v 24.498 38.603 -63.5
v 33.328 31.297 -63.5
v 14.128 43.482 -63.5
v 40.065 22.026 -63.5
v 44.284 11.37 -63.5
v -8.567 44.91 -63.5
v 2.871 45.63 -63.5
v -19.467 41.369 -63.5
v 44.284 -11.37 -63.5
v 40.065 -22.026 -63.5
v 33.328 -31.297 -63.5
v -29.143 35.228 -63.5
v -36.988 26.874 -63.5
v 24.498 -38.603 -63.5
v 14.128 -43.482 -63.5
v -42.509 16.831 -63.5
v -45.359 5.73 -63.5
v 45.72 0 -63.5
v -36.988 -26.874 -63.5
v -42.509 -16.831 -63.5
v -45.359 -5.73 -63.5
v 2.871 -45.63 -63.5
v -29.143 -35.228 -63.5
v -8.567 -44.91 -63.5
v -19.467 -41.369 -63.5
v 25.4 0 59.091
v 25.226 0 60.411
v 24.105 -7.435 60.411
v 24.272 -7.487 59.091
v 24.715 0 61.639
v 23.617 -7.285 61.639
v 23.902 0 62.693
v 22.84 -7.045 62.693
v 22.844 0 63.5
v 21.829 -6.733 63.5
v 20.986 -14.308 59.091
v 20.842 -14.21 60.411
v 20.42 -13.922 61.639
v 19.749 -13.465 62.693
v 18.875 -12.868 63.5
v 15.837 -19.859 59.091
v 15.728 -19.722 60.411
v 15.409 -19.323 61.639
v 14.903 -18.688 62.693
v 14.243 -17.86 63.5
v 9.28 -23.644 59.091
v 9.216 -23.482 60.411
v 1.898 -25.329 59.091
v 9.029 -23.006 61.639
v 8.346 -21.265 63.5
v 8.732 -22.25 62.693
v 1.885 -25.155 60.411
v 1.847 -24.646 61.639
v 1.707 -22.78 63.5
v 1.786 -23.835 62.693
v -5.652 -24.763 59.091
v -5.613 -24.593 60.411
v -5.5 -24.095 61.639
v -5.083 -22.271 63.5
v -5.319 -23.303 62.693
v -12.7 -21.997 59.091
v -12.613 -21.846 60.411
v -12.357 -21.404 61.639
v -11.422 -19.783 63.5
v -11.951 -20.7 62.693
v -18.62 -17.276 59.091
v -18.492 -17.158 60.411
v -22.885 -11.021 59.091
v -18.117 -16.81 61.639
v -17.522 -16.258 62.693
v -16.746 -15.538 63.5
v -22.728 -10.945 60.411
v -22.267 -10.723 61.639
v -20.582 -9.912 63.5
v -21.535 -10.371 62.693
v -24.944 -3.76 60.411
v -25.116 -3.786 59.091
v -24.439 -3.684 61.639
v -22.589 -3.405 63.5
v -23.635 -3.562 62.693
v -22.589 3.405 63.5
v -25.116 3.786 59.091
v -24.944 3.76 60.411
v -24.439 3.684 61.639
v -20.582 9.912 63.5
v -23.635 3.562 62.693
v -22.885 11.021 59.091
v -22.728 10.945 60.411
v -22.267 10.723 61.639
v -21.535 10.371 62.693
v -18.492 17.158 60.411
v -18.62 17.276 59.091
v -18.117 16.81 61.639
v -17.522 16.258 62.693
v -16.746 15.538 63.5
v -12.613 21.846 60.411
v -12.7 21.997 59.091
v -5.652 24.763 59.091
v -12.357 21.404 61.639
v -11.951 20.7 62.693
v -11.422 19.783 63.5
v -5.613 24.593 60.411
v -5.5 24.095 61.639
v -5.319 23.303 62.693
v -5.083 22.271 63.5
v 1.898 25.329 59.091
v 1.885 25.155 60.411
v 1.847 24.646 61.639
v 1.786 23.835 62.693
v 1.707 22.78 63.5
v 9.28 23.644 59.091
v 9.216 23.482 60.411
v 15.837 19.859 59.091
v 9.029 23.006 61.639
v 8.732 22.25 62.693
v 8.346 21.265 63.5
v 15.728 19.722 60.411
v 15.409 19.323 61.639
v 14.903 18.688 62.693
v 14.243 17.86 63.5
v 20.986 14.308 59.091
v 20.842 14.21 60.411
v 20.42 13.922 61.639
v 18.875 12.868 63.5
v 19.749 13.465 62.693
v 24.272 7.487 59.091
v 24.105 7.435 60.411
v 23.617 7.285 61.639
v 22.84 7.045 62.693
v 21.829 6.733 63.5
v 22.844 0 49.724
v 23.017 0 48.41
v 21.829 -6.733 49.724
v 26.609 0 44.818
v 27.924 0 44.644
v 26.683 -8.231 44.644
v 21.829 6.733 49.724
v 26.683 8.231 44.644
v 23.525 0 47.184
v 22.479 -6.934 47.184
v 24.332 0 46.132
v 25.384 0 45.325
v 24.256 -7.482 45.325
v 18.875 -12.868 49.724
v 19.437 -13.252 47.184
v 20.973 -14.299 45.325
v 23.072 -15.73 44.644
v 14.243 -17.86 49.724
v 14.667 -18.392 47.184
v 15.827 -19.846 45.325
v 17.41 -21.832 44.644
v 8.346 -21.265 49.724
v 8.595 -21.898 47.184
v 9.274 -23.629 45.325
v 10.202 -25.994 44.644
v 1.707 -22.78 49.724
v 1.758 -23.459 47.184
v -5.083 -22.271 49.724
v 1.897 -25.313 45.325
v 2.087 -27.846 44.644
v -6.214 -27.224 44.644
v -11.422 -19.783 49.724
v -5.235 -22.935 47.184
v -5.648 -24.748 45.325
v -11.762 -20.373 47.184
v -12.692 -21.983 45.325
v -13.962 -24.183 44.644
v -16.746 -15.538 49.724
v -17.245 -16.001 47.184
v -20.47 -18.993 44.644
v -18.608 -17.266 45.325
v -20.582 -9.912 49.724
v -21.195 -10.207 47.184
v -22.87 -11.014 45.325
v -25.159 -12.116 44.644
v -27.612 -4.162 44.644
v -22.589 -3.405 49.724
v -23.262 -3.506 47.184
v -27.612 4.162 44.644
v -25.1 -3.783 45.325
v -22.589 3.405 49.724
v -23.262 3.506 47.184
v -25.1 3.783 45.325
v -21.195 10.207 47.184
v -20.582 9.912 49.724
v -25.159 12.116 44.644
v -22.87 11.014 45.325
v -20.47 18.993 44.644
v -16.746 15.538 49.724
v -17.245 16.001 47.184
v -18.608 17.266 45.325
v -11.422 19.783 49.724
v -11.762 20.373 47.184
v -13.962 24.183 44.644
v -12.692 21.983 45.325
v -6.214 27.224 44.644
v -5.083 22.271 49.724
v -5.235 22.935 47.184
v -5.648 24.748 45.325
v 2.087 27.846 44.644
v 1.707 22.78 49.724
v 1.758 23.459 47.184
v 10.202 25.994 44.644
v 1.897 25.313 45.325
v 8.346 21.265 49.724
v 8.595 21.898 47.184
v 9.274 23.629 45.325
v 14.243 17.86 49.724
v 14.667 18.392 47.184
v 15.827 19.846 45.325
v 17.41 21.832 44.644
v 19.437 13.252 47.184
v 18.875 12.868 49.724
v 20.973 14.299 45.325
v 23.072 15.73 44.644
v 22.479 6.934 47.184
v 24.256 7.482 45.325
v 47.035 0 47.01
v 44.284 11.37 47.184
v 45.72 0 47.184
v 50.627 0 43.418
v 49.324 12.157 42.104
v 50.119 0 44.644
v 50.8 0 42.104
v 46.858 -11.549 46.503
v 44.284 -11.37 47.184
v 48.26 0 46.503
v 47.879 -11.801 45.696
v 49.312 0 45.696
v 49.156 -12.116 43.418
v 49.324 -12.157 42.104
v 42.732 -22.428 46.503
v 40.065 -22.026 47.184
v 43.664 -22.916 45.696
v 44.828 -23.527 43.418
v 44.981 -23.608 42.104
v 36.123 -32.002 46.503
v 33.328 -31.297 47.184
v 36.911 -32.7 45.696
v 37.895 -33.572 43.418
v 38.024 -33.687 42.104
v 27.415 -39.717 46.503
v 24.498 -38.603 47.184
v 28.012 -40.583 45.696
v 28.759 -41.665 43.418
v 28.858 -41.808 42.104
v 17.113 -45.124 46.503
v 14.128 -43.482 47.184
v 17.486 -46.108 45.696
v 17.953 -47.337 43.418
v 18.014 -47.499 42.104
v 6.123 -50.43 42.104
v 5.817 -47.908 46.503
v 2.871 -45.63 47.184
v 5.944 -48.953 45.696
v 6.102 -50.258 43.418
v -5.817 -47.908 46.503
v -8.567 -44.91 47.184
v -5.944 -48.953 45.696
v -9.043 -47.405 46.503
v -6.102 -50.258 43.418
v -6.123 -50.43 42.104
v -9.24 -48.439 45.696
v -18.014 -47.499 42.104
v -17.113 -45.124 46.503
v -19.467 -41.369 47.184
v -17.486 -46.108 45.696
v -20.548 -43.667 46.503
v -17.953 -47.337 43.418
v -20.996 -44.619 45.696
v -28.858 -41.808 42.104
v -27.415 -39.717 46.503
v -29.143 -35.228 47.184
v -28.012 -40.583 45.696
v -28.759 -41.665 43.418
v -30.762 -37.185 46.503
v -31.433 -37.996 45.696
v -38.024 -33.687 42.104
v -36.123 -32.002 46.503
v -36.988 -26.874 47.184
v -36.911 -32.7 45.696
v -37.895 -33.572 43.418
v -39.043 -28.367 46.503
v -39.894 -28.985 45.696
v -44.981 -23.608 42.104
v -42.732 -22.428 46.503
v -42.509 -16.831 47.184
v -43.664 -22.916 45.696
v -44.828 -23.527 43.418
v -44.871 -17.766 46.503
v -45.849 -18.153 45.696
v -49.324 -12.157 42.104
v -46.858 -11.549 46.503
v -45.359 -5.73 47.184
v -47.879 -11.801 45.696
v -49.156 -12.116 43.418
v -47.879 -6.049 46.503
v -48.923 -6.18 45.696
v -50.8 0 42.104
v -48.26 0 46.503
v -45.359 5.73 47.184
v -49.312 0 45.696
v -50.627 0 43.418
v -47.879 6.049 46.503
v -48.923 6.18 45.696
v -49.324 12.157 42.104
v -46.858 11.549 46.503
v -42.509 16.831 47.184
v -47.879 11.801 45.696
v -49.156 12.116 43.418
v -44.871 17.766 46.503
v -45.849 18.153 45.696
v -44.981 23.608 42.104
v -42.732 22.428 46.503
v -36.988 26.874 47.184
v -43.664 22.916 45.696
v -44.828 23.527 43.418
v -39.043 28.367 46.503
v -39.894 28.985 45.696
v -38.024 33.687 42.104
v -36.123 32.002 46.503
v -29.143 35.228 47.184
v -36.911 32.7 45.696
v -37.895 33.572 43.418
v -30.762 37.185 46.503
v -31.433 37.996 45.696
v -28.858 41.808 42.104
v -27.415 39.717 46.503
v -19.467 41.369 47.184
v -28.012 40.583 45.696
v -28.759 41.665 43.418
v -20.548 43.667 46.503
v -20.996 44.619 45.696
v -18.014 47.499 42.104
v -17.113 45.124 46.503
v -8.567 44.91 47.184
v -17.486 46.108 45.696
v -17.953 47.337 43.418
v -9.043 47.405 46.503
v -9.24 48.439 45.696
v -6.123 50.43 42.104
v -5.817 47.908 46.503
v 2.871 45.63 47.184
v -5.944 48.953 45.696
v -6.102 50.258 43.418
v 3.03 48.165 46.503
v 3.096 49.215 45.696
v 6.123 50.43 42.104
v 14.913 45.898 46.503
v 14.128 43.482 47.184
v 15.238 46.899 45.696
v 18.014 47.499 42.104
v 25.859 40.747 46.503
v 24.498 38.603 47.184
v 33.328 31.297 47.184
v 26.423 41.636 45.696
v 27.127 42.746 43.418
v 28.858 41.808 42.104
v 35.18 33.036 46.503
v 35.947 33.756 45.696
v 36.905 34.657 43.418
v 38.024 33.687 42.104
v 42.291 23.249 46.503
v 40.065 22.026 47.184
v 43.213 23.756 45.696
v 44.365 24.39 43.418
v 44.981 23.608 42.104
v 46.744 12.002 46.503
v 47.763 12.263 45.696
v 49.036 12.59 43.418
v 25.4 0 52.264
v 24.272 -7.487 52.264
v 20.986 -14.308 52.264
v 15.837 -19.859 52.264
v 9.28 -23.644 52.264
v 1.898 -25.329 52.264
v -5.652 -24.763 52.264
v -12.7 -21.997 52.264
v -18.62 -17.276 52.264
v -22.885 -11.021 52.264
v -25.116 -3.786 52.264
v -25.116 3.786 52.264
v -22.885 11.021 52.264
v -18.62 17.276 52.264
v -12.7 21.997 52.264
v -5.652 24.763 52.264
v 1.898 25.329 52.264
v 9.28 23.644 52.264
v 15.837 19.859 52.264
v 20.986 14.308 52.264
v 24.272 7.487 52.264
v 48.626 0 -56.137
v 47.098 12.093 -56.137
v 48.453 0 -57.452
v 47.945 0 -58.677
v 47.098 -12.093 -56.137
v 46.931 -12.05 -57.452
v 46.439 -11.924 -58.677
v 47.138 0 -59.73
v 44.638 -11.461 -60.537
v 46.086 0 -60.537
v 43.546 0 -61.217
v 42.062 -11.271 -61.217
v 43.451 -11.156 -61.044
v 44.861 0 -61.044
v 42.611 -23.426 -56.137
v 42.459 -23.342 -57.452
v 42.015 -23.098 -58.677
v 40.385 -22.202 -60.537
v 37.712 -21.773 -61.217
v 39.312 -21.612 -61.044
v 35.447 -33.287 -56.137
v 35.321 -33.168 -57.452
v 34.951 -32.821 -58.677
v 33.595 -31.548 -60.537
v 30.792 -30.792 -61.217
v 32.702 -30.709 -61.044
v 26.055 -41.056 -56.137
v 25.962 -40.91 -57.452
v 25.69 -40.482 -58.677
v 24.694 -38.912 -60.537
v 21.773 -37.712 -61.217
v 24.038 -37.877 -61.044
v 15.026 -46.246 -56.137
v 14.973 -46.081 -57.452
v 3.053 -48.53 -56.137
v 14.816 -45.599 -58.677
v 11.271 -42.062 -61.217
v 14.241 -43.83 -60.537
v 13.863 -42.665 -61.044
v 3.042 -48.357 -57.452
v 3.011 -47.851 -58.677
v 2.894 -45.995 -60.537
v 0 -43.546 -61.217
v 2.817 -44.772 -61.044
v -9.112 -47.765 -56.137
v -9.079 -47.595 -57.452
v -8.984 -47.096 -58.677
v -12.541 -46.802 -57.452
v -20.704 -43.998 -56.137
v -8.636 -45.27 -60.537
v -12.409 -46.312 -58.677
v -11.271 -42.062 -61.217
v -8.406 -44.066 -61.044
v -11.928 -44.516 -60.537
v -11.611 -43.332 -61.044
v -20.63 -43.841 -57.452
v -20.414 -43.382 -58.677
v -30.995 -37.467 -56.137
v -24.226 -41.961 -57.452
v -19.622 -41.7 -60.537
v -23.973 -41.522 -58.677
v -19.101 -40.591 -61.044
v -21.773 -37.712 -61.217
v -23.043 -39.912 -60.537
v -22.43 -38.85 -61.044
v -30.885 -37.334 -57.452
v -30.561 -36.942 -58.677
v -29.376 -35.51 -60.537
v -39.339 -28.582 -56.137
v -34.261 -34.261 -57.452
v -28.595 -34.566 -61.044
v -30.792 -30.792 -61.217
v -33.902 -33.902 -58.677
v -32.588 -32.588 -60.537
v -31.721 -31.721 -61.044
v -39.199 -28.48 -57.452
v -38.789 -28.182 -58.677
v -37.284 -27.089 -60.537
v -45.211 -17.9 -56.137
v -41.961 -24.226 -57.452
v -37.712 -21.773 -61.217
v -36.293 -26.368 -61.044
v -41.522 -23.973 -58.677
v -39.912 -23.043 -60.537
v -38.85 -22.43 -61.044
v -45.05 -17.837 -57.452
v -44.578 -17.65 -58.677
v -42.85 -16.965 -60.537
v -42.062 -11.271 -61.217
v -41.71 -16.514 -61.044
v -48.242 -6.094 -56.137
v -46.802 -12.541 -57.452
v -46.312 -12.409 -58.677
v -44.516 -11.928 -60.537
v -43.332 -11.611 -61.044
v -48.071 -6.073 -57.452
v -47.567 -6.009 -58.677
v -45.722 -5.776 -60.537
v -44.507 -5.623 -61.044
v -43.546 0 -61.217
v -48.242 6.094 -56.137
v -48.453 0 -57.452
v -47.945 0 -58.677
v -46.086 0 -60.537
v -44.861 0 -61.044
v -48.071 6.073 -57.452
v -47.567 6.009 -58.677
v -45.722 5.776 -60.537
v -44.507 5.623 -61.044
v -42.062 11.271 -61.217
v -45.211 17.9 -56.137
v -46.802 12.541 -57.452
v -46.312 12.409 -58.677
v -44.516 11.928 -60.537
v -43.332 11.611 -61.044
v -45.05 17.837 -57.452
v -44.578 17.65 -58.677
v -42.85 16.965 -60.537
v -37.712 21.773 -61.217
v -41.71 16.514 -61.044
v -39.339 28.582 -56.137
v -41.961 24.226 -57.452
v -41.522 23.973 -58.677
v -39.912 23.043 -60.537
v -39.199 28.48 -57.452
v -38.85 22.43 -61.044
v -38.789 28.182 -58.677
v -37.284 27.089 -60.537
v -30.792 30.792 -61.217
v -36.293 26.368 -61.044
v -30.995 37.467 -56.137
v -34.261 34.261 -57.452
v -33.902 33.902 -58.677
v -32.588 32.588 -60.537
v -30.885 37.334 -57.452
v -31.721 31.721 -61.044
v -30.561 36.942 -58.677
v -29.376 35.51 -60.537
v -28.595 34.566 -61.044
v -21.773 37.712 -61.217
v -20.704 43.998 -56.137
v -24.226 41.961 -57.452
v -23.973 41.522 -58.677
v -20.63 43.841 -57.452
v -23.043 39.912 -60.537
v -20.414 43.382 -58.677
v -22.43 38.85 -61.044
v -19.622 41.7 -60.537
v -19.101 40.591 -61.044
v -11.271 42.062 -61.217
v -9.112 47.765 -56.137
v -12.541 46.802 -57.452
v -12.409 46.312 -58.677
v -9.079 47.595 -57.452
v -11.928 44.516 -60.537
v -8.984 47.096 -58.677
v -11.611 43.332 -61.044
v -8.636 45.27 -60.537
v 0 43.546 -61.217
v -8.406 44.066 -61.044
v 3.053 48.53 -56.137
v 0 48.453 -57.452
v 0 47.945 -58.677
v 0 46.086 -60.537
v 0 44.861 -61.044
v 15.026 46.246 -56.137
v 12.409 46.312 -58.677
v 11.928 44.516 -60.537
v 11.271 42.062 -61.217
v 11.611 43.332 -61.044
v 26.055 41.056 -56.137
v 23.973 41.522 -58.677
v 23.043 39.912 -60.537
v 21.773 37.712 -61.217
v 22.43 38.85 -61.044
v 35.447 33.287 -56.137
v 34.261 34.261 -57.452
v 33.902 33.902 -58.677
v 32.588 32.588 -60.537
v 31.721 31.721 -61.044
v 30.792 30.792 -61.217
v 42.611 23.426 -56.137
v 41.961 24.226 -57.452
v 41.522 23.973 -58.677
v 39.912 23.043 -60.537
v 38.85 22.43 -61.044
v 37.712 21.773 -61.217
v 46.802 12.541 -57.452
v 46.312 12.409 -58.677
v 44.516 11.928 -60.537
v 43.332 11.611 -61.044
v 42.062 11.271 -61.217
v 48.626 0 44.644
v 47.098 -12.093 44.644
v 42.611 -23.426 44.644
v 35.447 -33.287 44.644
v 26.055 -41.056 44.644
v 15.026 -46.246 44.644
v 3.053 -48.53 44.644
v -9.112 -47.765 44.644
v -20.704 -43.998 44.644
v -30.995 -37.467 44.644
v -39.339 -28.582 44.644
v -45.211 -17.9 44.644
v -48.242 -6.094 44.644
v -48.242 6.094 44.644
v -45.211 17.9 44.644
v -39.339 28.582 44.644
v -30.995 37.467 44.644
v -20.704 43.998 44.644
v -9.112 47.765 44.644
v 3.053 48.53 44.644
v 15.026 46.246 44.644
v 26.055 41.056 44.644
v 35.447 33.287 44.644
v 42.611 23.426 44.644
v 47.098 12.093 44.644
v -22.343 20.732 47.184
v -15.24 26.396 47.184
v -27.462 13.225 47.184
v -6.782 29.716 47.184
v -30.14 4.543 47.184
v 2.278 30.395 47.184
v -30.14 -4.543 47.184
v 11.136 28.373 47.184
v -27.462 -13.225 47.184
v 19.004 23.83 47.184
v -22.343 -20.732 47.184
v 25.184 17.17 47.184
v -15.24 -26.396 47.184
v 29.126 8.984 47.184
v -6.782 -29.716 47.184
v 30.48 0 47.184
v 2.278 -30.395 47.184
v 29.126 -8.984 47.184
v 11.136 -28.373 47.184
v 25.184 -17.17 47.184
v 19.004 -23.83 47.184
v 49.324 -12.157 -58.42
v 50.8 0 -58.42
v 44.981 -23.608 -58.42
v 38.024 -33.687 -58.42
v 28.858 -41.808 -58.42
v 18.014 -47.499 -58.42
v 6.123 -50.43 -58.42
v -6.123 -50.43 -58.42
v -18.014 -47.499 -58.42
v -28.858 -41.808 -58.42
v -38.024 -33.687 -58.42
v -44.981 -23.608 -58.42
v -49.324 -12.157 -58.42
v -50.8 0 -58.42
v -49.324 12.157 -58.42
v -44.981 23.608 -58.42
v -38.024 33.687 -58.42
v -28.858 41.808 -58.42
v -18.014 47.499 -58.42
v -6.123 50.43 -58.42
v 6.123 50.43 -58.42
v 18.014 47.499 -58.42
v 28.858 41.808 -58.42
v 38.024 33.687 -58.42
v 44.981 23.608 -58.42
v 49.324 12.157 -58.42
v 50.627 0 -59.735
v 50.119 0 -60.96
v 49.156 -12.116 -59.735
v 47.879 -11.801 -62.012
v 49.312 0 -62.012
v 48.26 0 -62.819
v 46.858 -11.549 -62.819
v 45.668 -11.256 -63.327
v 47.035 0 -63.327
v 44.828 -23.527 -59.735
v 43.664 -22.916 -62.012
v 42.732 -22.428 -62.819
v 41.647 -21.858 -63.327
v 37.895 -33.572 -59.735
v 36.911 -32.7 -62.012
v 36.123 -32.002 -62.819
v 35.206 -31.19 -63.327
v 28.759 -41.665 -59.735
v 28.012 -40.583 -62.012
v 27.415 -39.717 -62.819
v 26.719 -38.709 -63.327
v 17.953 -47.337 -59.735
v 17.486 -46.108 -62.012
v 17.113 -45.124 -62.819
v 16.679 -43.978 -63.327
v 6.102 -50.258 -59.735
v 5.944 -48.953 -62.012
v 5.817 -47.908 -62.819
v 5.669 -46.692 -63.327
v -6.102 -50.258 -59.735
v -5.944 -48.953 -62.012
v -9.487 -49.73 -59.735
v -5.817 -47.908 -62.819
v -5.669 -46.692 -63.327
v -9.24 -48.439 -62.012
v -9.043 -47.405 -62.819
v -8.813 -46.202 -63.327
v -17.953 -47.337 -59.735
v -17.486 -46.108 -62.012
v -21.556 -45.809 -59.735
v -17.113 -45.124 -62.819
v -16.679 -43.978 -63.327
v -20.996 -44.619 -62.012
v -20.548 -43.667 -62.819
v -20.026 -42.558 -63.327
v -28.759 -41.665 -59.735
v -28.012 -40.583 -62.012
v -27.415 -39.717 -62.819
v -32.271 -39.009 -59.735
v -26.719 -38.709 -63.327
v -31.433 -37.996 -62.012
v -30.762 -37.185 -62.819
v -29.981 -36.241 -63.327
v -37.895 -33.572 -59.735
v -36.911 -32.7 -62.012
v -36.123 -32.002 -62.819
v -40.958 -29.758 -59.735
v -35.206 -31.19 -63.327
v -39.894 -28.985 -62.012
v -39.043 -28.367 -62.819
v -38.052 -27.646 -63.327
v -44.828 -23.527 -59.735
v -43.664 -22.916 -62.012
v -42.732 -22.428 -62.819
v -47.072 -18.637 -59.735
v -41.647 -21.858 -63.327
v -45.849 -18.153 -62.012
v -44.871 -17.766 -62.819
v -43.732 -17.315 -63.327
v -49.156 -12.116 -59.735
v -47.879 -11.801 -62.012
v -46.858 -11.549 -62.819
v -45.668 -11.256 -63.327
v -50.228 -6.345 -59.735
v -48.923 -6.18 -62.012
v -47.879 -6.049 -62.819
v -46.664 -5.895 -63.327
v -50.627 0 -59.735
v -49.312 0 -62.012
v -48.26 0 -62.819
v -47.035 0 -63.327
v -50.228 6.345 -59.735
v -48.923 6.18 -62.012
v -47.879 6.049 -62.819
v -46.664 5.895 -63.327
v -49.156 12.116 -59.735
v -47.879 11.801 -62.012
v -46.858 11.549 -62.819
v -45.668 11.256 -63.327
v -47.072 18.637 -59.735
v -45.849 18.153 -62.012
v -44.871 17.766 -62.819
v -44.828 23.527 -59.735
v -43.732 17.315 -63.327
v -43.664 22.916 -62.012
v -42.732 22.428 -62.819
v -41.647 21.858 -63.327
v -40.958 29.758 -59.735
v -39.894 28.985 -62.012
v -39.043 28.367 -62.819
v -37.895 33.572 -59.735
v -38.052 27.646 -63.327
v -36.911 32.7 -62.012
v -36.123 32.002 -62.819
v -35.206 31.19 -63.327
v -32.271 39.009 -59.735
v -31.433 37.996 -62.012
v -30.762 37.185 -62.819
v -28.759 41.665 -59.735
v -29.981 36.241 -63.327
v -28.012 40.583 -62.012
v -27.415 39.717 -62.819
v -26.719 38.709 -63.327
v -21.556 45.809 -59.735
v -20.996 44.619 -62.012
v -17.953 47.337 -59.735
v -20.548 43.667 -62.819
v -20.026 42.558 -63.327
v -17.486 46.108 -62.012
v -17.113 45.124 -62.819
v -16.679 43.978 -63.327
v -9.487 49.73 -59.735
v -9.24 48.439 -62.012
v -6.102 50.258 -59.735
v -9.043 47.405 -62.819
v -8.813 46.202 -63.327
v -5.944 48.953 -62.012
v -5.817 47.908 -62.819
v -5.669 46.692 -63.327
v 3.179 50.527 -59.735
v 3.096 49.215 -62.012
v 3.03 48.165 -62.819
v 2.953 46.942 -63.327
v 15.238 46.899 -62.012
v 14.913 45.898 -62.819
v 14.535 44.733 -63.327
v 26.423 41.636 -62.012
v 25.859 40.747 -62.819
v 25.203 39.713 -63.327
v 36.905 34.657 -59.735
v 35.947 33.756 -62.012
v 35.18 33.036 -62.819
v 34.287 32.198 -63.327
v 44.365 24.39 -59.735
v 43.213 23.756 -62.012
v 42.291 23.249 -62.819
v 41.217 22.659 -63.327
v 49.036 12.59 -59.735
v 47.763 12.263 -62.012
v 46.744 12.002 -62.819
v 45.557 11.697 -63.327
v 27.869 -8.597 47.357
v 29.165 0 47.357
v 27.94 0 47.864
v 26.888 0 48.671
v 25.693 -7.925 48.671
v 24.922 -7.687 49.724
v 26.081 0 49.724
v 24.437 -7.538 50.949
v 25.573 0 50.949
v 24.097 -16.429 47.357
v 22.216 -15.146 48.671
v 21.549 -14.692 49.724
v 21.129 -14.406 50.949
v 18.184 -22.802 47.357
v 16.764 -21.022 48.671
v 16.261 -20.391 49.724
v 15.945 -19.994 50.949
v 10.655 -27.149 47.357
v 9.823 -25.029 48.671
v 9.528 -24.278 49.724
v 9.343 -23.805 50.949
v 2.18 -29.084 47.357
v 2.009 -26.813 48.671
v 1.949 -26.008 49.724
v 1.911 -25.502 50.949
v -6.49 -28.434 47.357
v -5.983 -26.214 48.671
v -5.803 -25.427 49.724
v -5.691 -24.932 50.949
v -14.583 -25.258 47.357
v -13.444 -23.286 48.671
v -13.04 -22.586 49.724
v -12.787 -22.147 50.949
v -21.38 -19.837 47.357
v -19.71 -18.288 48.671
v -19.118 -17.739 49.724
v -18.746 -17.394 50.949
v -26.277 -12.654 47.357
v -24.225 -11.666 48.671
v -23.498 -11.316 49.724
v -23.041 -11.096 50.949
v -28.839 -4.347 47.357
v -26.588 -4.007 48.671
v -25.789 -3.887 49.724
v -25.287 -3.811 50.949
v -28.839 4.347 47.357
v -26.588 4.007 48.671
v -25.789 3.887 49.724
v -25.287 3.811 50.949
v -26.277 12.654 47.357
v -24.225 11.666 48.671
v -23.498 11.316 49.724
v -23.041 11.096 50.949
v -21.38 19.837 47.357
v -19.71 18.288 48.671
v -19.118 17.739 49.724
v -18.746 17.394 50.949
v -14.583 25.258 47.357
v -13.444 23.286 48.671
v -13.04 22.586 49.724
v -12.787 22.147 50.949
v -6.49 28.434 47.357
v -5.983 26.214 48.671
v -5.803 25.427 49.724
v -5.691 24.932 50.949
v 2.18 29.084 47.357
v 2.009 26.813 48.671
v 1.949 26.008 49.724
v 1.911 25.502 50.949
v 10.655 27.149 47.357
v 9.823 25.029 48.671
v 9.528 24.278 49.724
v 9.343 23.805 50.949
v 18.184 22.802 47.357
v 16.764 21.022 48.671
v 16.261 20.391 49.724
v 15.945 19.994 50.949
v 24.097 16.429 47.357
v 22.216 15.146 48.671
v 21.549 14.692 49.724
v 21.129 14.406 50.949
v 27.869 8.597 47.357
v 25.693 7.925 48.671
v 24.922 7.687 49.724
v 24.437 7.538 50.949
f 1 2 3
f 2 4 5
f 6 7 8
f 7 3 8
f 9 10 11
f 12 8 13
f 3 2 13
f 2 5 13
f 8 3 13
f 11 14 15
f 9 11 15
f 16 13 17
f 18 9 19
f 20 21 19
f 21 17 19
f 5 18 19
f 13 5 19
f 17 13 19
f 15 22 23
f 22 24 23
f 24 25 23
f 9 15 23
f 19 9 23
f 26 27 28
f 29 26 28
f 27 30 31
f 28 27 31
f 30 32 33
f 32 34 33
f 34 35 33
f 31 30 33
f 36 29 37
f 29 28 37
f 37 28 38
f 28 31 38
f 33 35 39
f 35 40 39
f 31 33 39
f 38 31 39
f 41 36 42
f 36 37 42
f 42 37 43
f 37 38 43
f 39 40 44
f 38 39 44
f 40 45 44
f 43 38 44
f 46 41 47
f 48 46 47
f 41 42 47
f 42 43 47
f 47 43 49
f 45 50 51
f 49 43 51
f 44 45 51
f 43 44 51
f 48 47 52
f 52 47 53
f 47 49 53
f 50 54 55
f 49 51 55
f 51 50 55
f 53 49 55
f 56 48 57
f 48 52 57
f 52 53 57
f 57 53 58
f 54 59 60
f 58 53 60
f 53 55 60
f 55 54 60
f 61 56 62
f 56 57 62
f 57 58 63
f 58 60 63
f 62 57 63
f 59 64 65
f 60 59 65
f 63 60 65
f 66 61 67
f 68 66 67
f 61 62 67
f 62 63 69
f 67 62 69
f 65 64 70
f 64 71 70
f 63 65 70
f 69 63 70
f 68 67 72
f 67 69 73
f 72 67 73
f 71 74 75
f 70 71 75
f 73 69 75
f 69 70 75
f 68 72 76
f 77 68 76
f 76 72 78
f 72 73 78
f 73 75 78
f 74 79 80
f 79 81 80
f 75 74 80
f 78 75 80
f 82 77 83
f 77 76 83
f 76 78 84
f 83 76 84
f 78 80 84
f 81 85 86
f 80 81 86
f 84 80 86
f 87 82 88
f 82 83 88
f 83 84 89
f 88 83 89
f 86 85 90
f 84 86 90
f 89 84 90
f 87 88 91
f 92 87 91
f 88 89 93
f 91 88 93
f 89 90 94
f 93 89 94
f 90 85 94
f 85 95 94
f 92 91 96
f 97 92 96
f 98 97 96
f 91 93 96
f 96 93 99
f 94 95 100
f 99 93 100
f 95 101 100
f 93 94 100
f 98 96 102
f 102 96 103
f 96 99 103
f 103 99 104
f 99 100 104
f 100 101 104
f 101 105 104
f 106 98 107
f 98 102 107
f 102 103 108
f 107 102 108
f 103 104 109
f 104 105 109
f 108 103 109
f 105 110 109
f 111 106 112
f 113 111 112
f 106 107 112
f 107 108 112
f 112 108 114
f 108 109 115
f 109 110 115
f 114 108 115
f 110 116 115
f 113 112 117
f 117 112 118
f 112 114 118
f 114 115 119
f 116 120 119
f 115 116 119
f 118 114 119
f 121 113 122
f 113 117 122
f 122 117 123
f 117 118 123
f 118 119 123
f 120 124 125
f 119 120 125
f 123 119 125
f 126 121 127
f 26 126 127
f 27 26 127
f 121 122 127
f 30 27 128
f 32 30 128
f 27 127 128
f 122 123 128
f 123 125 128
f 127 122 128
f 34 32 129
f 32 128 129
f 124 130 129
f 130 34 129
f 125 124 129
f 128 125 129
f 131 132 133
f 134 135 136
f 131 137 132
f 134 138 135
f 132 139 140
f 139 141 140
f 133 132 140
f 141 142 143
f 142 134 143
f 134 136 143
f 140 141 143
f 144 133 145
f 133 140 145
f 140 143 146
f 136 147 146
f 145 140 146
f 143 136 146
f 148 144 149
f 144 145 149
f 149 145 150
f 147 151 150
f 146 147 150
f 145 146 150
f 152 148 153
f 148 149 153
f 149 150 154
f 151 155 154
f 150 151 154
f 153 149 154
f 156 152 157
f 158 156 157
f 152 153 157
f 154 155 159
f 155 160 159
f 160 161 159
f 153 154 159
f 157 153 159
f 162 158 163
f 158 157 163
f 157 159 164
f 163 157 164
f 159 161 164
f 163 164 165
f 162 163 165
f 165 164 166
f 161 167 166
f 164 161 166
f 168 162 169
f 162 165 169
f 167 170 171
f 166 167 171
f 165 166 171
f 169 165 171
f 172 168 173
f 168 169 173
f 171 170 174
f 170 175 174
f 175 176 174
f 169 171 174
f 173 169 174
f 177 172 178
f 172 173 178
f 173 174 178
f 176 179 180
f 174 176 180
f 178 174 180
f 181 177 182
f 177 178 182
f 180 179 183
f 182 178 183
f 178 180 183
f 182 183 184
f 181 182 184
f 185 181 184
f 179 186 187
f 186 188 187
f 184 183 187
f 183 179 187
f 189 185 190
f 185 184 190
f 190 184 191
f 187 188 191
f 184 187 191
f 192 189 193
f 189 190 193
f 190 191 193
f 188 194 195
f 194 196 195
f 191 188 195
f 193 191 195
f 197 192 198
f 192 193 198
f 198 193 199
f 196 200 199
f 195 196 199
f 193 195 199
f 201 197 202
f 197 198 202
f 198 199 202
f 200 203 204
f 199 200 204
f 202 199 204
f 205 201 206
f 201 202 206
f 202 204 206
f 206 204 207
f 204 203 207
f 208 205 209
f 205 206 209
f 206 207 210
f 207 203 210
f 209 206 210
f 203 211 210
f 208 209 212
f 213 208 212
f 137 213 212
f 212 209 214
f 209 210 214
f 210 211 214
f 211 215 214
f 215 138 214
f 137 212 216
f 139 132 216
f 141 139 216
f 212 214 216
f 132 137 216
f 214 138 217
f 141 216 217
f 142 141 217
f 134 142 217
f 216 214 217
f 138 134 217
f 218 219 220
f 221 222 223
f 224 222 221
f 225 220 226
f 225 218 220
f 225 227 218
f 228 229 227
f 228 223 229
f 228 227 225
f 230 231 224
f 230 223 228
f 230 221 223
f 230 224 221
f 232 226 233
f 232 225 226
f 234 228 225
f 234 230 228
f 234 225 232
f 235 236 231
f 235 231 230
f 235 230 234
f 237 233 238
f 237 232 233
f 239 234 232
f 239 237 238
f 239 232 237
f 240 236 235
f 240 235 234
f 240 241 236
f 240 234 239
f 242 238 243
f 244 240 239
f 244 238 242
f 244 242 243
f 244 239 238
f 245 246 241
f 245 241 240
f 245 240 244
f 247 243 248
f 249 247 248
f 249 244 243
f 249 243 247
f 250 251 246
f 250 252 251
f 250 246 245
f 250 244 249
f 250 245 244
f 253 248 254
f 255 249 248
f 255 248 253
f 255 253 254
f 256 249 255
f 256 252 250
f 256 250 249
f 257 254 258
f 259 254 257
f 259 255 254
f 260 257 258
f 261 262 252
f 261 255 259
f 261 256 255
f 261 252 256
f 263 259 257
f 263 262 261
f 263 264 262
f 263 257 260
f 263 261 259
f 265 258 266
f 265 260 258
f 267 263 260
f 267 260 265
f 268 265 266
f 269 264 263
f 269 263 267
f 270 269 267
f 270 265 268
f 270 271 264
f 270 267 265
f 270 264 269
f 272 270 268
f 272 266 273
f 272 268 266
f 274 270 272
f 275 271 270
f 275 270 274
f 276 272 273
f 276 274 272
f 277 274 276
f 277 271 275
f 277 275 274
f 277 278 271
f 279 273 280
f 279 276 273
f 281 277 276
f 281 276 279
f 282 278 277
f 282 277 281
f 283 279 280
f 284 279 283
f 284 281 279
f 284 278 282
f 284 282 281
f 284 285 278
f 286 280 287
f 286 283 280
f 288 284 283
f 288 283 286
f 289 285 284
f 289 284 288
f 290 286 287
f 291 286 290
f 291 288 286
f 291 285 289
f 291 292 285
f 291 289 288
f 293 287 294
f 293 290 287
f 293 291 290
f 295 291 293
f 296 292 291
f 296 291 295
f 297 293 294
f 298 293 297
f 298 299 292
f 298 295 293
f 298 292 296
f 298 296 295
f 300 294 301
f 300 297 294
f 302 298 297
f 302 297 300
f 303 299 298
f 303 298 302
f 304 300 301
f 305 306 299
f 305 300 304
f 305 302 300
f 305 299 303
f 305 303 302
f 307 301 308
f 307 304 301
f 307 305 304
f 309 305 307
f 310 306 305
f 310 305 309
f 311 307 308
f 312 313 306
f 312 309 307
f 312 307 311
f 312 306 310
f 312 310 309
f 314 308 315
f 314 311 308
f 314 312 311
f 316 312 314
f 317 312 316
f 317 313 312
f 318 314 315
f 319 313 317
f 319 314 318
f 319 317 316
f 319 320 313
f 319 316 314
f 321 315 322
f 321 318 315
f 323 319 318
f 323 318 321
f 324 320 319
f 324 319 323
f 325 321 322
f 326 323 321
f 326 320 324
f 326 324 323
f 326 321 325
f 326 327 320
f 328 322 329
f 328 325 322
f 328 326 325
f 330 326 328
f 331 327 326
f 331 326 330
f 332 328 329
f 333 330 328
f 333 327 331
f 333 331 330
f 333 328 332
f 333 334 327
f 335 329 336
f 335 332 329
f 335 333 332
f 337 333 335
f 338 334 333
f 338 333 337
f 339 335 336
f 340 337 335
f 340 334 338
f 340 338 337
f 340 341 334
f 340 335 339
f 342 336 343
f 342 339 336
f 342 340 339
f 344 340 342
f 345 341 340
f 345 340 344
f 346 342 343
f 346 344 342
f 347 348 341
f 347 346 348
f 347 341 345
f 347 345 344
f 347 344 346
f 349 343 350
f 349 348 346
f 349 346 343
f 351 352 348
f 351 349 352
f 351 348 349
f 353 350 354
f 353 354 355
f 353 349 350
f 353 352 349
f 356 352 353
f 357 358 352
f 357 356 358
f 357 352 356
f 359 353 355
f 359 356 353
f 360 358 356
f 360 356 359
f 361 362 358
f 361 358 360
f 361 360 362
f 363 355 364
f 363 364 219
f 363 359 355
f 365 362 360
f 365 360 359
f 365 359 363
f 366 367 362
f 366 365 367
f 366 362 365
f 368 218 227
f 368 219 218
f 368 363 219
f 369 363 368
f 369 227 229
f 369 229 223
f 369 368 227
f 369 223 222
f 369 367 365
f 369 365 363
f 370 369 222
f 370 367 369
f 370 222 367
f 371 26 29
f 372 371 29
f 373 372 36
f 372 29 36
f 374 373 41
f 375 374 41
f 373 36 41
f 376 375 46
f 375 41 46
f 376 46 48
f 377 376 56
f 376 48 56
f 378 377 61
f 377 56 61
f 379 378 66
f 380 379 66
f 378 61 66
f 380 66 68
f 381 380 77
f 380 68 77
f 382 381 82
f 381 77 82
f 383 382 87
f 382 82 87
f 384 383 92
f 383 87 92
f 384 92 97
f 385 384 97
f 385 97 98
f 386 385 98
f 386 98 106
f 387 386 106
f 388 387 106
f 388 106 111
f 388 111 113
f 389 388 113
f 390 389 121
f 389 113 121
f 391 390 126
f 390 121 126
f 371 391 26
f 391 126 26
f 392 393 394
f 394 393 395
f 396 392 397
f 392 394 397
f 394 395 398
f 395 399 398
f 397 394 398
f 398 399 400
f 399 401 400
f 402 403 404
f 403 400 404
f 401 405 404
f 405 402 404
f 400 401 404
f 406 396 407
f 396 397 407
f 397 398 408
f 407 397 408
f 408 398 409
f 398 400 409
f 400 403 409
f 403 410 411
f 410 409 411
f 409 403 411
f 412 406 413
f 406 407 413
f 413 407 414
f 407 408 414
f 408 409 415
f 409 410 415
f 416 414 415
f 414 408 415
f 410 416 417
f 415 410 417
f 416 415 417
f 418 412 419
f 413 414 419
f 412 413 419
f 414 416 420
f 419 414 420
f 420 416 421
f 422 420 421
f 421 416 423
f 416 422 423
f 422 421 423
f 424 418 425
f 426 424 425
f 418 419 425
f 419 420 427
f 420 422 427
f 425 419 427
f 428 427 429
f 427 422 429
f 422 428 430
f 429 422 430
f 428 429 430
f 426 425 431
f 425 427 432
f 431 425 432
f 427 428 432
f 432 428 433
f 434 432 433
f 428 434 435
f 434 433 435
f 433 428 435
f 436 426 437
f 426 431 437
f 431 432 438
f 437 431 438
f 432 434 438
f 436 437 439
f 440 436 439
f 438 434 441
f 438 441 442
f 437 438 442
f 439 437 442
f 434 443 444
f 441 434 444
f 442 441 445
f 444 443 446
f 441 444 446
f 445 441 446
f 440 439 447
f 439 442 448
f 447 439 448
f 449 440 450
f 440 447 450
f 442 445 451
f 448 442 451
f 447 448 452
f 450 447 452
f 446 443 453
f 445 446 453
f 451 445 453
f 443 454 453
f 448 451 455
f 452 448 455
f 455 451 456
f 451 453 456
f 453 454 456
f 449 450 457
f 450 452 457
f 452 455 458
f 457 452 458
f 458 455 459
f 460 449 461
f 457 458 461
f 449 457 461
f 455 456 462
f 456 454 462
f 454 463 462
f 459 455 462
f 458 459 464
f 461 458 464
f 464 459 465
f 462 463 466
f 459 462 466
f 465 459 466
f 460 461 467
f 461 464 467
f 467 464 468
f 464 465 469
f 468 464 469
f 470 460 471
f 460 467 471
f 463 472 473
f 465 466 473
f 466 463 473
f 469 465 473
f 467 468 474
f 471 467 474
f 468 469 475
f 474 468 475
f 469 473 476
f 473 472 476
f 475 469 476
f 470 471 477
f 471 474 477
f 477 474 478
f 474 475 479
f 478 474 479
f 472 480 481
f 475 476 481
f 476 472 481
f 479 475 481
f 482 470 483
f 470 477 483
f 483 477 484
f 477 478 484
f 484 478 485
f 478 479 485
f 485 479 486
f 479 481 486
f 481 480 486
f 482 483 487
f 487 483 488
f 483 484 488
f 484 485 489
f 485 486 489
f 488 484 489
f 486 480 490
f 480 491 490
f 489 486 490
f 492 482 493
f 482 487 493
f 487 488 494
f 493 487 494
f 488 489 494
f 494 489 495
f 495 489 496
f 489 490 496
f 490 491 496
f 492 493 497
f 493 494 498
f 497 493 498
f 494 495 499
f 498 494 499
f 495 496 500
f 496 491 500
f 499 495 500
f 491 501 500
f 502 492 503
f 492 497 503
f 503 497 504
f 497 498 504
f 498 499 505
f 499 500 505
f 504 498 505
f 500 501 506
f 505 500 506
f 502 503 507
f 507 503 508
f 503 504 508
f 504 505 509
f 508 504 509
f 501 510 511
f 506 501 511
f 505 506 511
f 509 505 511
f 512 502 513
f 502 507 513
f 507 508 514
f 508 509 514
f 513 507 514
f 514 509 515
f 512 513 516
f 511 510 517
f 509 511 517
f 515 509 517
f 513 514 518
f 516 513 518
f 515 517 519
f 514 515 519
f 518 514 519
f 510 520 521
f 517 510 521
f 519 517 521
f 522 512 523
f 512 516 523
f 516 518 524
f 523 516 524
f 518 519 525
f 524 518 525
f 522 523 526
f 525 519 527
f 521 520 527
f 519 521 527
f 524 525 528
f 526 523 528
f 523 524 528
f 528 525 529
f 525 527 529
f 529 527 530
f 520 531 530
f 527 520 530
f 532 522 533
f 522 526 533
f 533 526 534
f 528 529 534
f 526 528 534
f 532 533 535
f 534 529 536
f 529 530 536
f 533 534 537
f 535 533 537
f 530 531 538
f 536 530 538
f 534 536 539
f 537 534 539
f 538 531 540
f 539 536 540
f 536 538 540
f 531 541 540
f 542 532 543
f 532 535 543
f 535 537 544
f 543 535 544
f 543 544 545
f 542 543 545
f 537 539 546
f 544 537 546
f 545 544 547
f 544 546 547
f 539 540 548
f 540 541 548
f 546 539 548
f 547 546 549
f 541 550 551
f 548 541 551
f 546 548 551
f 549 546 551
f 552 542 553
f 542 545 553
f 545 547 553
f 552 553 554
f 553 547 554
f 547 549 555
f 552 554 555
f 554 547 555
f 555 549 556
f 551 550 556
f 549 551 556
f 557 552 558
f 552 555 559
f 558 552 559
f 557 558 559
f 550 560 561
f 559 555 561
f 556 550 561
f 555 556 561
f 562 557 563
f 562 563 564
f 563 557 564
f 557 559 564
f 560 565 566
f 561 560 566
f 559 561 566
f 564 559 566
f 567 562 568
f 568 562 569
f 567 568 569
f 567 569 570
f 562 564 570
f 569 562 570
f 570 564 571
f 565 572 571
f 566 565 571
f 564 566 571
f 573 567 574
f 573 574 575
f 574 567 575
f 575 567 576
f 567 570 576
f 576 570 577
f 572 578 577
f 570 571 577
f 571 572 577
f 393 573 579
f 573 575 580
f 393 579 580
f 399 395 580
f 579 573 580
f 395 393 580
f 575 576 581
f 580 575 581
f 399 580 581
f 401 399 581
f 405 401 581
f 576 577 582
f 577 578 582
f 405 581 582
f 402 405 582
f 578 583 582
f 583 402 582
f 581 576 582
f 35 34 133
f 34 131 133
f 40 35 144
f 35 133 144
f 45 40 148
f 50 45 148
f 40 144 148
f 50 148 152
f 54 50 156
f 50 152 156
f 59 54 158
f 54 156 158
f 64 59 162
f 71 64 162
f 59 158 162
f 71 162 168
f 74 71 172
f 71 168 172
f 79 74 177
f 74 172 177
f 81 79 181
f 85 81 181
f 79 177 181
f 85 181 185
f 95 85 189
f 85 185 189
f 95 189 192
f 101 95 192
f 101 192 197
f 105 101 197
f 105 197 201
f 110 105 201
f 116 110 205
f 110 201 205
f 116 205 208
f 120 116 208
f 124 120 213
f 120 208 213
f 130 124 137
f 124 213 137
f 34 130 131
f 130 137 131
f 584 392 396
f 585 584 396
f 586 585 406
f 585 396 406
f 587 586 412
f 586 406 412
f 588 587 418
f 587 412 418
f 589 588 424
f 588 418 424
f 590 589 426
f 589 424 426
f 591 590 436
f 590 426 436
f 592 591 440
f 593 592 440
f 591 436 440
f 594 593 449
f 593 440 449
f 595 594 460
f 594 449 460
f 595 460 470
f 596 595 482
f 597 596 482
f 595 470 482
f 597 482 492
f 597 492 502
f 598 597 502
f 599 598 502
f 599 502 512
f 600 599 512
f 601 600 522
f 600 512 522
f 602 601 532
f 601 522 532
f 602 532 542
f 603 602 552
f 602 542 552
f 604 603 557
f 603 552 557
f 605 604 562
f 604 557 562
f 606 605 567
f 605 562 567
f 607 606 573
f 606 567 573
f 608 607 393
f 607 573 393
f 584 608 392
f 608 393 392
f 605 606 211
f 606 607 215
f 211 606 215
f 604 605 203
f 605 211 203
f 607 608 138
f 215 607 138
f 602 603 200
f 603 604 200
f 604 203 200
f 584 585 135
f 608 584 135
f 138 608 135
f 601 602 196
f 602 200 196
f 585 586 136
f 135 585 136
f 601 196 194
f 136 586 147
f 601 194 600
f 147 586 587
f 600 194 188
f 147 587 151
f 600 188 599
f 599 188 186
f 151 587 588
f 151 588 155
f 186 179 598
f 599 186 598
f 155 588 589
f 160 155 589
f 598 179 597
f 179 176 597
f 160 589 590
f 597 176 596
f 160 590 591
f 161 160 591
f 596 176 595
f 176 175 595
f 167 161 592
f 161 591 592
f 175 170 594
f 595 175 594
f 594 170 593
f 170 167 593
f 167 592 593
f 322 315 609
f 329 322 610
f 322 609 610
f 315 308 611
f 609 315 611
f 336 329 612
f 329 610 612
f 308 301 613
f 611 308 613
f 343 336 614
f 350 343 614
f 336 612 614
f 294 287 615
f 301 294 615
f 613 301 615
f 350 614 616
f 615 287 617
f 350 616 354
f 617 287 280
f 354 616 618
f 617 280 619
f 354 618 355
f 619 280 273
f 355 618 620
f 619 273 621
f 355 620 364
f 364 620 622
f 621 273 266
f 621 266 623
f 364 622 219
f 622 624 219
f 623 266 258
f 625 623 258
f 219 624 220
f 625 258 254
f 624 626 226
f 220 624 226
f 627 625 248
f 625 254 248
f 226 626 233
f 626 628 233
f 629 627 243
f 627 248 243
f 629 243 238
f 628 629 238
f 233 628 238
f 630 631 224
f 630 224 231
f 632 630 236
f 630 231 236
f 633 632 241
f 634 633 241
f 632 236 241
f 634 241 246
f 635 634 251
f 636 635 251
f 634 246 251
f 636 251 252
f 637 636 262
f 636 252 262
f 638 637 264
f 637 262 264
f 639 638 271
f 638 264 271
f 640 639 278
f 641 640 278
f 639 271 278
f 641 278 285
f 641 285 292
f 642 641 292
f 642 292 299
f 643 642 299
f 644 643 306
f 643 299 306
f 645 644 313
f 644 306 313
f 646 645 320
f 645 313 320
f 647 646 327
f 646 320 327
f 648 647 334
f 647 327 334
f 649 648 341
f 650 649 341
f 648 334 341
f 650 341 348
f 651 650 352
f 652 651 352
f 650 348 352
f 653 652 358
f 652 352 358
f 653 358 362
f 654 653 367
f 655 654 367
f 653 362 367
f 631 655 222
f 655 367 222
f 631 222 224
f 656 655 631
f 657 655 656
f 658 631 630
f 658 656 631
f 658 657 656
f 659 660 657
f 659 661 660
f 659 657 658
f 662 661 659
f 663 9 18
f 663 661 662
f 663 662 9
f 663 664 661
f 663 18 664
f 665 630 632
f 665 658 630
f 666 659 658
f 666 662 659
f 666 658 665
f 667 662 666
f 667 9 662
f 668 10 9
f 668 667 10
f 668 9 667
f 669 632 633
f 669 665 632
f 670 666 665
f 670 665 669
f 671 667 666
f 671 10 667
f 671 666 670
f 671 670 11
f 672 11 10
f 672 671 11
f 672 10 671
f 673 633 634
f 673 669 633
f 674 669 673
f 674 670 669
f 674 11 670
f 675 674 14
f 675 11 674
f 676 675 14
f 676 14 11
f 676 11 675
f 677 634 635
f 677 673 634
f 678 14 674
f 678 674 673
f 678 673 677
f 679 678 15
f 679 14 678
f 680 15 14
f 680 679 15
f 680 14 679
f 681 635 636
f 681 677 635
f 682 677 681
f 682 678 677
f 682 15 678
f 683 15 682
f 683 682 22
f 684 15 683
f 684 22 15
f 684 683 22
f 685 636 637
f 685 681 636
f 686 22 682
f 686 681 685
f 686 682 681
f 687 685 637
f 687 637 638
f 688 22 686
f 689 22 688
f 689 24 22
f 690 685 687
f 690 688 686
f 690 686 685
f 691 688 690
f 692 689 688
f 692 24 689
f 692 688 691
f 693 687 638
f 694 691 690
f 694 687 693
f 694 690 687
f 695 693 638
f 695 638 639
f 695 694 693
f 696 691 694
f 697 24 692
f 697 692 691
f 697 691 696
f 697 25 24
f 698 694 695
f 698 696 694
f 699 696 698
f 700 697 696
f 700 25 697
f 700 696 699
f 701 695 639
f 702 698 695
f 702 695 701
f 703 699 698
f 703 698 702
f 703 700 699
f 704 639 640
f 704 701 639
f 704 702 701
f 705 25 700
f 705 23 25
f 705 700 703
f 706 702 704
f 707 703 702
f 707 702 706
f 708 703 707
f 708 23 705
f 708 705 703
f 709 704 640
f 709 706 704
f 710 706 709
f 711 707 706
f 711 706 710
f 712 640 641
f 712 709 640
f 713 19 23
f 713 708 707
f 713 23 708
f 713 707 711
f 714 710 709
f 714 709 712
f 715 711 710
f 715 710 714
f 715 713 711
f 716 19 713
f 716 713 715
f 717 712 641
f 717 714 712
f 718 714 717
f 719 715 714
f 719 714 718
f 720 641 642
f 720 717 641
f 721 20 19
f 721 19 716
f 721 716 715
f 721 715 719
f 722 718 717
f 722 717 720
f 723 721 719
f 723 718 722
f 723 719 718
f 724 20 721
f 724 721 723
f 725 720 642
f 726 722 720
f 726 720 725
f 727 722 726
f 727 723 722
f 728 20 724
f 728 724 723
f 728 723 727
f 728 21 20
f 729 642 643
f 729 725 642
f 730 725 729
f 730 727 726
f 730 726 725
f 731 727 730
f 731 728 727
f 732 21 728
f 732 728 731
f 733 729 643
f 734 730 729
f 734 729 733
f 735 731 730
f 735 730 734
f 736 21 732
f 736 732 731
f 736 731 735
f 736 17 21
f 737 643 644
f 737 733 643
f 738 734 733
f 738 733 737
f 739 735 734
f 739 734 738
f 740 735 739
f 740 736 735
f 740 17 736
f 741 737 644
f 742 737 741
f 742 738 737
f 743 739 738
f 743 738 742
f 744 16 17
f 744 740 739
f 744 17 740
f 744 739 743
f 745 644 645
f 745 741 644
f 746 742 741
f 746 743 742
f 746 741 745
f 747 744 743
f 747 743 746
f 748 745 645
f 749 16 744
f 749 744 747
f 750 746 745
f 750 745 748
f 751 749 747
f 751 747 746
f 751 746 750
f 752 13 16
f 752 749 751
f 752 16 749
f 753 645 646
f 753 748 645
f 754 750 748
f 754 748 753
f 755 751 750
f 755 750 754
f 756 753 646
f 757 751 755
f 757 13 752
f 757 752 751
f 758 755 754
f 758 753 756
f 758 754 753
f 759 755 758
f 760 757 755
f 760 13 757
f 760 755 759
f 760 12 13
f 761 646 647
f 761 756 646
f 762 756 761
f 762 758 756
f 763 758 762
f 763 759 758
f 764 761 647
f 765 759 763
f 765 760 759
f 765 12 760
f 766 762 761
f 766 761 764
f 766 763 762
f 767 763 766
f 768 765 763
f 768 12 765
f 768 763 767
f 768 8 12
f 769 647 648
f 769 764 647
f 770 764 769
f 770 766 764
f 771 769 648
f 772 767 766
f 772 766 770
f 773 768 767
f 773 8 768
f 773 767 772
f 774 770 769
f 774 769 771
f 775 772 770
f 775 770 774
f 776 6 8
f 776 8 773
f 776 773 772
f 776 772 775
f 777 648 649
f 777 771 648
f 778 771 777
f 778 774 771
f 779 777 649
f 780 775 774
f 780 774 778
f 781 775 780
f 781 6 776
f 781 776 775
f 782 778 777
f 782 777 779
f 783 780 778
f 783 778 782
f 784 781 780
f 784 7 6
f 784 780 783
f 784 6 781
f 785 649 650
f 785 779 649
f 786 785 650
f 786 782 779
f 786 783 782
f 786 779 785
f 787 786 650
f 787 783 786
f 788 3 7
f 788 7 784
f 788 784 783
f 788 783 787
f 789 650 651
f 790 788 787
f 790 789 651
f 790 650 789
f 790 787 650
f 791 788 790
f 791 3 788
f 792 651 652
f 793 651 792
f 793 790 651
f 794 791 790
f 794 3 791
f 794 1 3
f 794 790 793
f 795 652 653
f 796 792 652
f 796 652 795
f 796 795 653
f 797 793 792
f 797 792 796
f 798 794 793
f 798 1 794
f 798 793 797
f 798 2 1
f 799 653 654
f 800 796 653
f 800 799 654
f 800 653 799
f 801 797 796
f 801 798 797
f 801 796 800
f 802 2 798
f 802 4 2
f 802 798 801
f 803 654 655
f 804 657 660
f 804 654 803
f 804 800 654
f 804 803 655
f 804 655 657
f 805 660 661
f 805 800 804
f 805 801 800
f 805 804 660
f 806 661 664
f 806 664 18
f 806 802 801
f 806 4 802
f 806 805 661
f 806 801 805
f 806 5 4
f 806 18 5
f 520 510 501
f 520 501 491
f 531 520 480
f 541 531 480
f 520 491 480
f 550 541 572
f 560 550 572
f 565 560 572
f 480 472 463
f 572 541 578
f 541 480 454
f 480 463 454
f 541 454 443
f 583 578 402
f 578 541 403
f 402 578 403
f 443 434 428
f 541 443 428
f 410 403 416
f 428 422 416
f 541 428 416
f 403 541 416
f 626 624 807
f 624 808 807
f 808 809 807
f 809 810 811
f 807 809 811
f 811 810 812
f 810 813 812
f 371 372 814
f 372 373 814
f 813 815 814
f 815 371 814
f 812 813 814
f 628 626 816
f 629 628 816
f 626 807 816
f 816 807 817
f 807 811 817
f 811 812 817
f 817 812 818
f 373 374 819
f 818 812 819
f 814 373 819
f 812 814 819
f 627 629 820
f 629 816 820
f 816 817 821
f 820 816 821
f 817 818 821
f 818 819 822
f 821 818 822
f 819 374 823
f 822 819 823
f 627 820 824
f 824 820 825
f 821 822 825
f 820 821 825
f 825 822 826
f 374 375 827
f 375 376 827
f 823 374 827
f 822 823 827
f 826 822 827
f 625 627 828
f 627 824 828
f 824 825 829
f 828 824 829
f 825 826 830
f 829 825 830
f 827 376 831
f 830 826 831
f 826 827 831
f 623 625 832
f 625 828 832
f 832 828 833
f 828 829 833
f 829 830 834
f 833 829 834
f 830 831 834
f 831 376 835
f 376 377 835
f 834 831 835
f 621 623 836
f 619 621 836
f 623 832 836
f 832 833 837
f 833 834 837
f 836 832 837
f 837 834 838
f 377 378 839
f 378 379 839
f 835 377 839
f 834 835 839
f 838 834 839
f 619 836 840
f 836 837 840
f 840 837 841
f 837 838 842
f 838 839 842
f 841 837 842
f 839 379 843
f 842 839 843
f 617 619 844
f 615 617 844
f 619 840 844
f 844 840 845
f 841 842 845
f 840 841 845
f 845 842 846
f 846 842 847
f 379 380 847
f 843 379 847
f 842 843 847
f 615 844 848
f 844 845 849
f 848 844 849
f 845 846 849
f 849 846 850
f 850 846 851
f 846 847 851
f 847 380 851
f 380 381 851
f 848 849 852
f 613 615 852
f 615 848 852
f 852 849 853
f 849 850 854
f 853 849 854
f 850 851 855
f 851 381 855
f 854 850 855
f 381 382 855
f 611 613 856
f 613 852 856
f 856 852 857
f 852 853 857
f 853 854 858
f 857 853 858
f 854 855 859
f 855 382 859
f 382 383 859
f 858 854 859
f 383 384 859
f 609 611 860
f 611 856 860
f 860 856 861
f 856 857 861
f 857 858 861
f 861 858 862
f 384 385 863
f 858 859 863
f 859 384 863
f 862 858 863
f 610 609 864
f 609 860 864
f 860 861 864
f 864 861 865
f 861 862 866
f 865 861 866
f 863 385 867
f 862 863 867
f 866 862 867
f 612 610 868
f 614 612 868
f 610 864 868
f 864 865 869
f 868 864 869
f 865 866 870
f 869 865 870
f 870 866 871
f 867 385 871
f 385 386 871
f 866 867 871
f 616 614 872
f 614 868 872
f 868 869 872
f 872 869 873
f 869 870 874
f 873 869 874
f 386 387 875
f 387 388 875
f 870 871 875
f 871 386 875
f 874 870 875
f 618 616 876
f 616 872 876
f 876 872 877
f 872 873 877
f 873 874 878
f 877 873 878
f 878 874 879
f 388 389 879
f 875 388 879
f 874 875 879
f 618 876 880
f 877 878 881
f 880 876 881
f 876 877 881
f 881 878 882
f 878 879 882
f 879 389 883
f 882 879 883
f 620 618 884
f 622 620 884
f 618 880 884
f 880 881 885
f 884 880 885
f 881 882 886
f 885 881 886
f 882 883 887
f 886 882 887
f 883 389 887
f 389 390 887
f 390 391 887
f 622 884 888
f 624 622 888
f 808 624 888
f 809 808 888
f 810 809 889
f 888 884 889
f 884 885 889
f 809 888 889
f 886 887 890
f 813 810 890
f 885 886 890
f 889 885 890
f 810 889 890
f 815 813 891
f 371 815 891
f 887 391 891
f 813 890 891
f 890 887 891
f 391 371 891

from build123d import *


# Not quite as in the source:
# - a fillet or chamfer that OpenCascade refuses, or shapes differently, is made with other operations: its cross-section is extruded or revolved along the edge and cut away or added


with BuildPart() as f1:
    # F0 (on Front) → F1 (revolve)
    with BuildSketch(Plane.XZ):
        Polygon((25.4, 63.5), (22.844016552, 63.5), (22.844016552, 44.6444414556), (48.6258789897, 44.6444414556), (48.6258789897, -61.2174496055), (1.9450800028, -61.2174496055), (0, -61.2174496055), (0, -63.5), (50.8, -63.5), (50.8, 47.1835695207), (25.4, 47.1835695207), (25.4, 62.8089383245), align=None)
    revolve(axis=Axis((0, 0, -31.75), (0, 0, -1)))

    # F2: fillet of radius 5.08 on 7 edges, made by hand

    # F2_s1 → F2_t2 (revolve)
    with BuildSketch(Plane.XZ):
        with BuildLine():
            ThreePointArc((30.48, 47.1835695207), (26.8878975516, 48.6714670723), (25.4, 52.2635695207))
            Line((25.4, 52.2635695207), (25.4, 47.1835695207))
            Line((25.4, 47.1835695207), (30.48, 47.1835695207))
        make_face()
    revolve(axis=Axis((0, 0, 47.1835695207), (0, 0, -1)))

    # F2_s3 → F2_t4 (revolve)
    with BuildSketch(Plane.XZ):
        with BuildLine():
            ThreePointArc((48.6258789897, -56.1374496055), (47.1379814381, -59.7295520539), (43.5458789897, -61.2174496055))
            Line((43.5458789897, -61.2174496055), (48.6258789897, -61.2174496055))
            Line((48.6258789897, -61.2174496055), (48.6258789897, -56.1374496055))
        make_face()
    revolve(axis=Axis((0, 0, -61.2174496055), (0, 0, -1)))

    # F2_s5 → F2_t6 (revolve, cut)
    with BuildSketch(Plane.XZ):
        with BuildLine():
            ThreePointArc((45.72, 47.1835695207), (49.3121024484, 45.6956719691), (50.8, 42.1035695207))
            Line((50.8, 42.1035695207), (50.8, 47.1835695207))
            Line((50.8, 47.1835695207), (45.72, 47.1835695207))
        make_face()
    revolve(axis=Axis((0, 0, 47.1835695207), (0, 0, -1)), mode=Mode.SUBTRACT)

    # F2_s7 → F2_t8 (revolve, cut)
    with BuildSketch(Plane.XZ):
        with BuildLine():
            ThreePointArc((25.4, 59.0914015328), (24.7147926051, 61.6393807238), (22.844016552, 63.5))
            Line((22.844016552, 63.5), (25.4, 63.5))
            Line((25.4, 63.5), (25.4, 59.0914015328))
        make_face()
    revolve(axis=Axis((0, 0, 63.5), (0, 0, -1)), mode=Mode.SUBTRACT)

    # F2_s9 → F2_t10 (revolve, cut)
    with BuildSketch(Plane.XZ):
        with BuildLine():
            ThreePointArc((22.844016552, 49.7244414556), (24.3319141035, 46.1323390072), (27.924016552, 44.6444414556))
            Line((27.924016552, 44.6444414556), (22.844016552, 44.6444414556))
            Line((22.844016552, 44.6444414556), (22.844016552, 49.7244414556))
        make_face()
    revolve(axis=Axis((0, 0, 44.6444414556), (0, 0, -1)), mode=Mode.SUBTRACT)

    # F2_s11 → F2_t12 (revolve, cut)
    with BuildSketch(Plane.XZ):
        with BuildLine():
            ThreePointArc((50.8, -58.42), (49.3121024484, -62.0121024484), (45.72, -63.5))
            Line((45.72, -63.5), (50.8, -63.5))
            Line((50.8, -63.5), (50.8, -58.42))
        make_face()
    revolve(axis=Axis((0, 0, -63.5), (0, 0, -1)), mode=Mode.SUBTRACT)


solid = f1.part
